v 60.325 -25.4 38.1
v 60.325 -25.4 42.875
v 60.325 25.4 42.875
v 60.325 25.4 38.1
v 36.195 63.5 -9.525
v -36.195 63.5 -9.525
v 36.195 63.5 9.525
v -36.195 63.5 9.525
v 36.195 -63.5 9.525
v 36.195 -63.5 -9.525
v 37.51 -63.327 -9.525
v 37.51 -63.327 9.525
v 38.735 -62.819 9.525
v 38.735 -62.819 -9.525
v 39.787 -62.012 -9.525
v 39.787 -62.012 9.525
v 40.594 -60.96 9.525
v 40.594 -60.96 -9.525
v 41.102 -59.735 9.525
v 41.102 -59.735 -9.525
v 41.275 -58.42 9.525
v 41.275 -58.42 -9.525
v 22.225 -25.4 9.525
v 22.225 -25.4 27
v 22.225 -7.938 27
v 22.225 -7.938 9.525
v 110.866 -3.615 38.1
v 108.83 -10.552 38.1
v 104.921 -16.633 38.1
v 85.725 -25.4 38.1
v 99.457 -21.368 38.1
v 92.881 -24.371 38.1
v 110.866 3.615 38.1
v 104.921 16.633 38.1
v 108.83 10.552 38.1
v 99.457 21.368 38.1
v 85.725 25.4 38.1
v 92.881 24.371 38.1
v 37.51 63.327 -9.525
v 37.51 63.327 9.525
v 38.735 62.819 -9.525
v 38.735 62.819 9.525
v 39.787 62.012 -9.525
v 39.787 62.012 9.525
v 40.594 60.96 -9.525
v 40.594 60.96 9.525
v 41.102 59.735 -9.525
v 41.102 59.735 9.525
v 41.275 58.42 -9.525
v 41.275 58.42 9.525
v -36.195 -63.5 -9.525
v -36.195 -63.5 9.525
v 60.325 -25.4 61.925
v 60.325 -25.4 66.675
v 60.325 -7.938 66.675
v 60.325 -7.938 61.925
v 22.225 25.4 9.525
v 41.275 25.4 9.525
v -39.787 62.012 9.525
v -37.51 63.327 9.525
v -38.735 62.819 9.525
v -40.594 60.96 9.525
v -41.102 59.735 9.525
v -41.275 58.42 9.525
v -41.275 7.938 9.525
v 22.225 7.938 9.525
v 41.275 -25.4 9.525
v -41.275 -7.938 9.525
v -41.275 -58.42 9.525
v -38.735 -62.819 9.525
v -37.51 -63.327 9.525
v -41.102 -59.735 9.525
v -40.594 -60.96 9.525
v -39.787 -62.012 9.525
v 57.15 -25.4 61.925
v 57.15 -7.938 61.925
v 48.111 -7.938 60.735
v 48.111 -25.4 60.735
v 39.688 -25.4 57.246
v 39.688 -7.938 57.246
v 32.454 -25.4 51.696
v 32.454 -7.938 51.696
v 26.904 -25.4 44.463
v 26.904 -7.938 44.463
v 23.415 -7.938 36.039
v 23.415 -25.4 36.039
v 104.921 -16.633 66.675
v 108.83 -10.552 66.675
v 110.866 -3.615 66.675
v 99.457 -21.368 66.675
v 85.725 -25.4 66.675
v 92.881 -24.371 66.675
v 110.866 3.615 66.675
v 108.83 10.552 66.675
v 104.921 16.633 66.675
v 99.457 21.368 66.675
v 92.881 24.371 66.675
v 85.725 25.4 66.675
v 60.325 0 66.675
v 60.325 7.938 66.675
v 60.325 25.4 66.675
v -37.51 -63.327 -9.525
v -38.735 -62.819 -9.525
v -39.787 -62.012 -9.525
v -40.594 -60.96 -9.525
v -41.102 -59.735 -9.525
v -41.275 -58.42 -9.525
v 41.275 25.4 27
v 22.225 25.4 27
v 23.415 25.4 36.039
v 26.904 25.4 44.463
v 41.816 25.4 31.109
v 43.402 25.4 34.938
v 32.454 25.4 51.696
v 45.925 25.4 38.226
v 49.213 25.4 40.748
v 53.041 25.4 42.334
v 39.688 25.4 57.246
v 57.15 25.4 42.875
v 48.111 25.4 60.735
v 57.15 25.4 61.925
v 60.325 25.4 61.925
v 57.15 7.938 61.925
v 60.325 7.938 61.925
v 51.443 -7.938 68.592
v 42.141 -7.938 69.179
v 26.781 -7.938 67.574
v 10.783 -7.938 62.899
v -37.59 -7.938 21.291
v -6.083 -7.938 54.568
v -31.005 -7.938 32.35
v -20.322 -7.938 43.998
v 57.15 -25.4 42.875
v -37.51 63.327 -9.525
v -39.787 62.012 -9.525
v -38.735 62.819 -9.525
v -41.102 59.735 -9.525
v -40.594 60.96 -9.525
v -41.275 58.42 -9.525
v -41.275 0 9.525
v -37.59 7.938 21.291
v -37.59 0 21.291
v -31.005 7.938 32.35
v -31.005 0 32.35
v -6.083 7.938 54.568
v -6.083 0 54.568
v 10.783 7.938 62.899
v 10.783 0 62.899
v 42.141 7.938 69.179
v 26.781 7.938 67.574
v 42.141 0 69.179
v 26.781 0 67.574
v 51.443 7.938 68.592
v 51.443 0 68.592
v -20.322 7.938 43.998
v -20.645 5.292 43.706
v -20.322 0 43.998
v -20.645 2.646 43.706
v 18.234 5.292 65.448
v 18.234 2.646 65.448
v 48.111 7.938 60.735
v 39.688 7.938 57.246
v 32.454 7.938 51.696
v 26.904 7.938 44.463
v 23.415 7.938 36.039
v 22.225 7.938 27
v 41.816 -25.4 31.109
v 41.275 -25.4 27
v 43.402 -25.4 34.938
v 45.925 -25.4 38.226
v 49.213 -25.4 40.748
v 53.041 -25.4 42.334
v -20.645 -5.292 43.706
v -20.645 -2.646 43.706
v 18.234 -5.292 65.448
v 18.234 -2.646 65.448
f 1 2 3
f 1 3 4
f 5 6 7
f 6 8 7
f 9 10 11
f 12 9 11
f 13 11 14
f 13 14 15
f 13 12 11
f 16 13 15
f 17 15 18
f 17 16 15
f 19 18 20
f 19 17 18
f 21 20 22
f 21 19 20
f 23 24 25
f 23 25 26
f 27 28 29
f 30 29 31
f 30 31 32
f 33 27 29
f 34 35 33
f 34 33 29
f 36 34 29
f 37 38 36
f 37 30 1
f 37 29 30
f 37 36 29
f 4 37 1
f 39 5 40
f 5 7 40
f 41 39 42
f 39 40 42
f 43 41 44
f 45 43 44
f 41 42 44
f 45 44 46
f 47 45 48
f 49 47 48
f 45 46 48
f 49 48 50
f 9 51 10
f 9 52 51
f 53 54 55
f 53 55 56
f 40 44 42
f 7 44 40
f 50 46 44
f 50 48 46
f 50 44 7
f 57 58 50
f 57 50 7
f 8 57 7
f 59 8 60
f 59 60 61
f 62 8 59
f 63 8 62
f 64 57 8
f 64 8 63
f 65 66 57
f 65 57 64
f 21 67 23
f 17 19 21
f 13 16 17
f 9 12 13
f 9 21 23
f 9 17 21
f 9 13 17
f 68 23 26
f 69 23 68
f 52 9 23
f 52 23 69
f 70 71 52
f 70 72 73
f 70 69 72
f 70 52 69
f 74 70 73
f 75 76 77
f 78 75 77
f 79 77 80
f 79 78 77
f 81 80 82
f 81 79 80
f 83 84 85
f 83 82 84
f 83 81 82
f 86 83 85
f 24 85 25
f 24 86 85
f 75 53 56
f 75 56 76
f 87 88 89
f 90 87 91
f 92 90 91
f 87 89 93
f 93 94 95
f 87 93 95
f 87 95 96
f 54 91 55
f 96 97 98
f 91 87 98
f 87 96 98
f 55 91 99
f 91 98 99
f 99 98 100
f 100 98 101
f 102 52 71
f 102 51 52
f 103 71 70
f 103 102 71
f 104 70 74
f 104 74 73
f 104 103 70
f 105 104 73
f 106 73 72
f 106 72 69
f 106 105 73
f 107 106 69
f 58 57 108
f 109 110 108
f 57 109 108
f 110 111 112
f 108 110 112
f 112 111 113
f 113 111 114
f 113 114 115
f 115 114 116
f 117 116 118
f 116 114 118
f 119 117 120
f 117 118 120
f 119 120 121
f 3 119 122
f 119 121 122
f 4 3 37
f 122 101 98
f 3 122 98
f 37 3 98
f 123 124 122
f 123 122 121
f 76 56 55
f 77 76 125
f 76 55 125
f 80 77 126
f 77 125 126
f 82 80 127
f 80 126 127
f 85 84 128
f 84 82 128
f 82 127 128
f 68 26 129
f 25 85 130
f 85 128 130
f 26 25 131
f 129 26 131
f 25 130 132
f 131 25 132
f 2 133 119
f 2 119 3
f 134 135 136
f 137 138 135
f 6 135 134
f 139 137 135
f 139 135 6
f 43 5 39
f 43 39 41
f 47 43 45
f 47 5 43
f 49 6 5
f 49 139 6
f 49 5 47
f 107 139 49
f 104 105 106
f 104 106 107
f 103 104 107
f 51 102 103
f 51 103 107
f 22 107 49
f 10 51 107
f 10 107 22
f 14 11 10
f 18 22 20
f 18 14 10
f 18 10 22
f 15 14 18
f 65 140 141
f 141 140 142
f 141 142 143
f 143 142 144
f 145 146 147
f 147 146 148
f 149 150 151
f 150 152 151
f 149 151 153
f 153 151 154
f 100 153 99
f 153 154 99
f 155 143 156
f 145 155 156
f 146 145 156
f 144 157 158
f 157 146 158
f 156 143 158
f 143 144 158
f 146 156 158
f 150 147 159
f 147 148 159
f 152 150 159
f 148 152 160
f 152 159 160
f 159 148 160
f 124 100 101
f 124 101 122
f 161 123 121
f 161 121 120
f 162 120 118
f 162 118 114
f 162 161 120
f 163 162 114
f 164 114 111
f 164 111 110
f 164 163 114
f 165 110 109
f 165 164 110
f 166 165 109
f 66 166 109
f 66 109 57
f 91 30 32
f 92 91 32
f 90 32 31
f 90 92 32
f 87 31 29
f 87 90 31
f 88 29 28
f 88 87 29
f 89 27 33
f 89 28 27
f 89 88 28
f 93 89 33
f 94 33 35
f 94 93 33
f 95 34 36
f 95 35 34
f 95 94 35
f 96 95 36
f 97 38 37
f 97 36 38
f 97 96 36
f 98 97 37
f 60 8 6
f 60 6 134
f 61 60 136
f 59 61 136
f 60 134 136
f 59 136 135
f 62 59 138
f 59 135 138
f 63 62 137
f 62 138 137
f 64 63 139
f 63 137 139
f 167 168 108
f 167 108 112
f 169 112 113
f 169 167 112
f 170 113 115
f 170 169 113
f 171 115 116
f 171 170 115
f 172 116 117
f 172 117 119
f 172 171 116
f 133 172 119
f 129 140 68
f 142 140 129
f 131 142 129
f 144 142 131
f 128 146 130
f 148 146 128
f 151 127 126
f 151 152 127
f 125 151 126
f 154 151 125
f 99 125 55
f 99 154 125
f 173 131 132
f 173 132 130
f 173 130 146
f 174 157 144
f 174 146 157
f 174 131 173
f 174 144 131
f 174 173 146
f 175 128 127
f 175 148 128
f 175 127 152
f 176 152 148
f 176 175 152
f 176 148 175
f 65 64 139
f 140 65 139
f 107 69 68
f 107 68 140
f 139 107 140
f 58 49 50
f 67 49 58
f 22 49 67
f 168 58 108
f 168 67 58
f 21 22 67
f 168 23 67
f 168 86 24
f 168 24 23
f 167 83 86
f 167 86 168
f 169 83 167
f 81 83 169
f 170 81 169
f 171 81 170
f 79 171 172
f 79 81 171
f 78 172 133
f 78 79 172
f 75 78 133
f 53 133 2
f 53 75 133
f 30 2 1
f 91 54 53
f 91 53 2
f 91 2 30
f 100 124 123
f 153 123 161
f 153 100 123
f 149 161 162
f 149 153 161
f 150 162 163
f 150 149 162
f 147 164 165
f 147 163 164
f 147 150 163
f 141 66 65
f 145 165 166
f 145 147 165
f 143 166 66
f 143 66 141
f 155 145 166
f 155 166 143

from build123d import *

# Parameters (mm, degrees)
F1_DEPTH = 63.5
F2_DEPTH = 25.4
F3_DEPTH = 7.9375
F0_W     = 25.4
F0_H     = 28.575
F5_R     = 5.08


with BuildPart() as f1:
    # F0 (on Front) → F1 (new body, symmetric)
    with BuildSketch(Plane.XZ):
        Polygon((-41.275, -9.525), (41.275, -9.525), (41.275, 9.525), (22.225, 9.525), (-41.275, 9.525), align=None)
    extrude(amount=F1_DEPTH, both=True)

    # F0 (on Front) → F2 (join, symmetric)
    with BuildSketch(Plane.XZ):
        with BuildLine():
            Line((22.225, 9.525), (41.275, 9.525))
            Line((41.275, 9.525), (41.275, 27.0002))
            ThreePointArc((41.275, 27.0002), (45.92468, 38.22552), (57.15, 42.8752))
            Line((57.15, 42.8752), (60.325, 42.8752))
            Line((60.325, 42.8752), (60.325, 61.9252))
            Line((60.325, 61.9252), (57.15, 61.9252))
            ThreePointArc((57.15, 61.9252), (32.454296, 51.695904), (22.225, 27.0002))
            Line((22.225, 27.0002), (22.225, 9.525))
        make_face()
        Polygon((85.725, 66.675), (60.325, 66.675), (60.325, 61.9252), (60.325, 42.8752), (60.325, 38.1), (85.725, 38.1), align=None)
    extrude(amount=F2_DEPTH, both=True)

    # F0 (on Front) → F3 (join, symmetric)
    with BuildSketch(Plane.XZ):
        with BuildLine():
            add(Edge.make_bspline(
                [(-41.275, 9.525), (-34.780891, 47.233644), (21.640048, 78.397568), (60.325, 66.675)],
                knots=[0, 0, 0, 0, 116.570504, 116.570504, 116.570504, 116.570504], degree=3))
            Line((-41.275, 9.525), (22.225, 9.525))
            Line((22.225, 9.525), (22.225, 27.0002))
            ThreePointArc((22.225, 27.0002), (32.454296, 51.695904), (57.15, 61.9252))
            Line((57.15, 61.9252), (60.325, 61.9252))
            Line((60.325, 61.9252), (60.325, 66.675))
        make_face()
    extrude(amount=F3_DEPTH, both=True)

    # F0 (on Front) → F4 (revolve)
    with BuildSketch(Plane.XZ):
        with Locations((98.425, 52.3875)):
            Rectangle(F0_W, F0_H)
    revolve(axis=Axis((85.725, 0, 52.3875), (0, 0, 1)))

    # F5
    f5_edges = [f1.edges().sort_by_distance(p)[0] for p in [
        (41.275, -63.5, 0),
        (-41.275, -63.5, 0),
        (-41.275, 63.5, 0),
        (41.275, 63.5, 0),
    ]]
    fillet(f5_edges, radius=F5_R)


solid = f1.part
